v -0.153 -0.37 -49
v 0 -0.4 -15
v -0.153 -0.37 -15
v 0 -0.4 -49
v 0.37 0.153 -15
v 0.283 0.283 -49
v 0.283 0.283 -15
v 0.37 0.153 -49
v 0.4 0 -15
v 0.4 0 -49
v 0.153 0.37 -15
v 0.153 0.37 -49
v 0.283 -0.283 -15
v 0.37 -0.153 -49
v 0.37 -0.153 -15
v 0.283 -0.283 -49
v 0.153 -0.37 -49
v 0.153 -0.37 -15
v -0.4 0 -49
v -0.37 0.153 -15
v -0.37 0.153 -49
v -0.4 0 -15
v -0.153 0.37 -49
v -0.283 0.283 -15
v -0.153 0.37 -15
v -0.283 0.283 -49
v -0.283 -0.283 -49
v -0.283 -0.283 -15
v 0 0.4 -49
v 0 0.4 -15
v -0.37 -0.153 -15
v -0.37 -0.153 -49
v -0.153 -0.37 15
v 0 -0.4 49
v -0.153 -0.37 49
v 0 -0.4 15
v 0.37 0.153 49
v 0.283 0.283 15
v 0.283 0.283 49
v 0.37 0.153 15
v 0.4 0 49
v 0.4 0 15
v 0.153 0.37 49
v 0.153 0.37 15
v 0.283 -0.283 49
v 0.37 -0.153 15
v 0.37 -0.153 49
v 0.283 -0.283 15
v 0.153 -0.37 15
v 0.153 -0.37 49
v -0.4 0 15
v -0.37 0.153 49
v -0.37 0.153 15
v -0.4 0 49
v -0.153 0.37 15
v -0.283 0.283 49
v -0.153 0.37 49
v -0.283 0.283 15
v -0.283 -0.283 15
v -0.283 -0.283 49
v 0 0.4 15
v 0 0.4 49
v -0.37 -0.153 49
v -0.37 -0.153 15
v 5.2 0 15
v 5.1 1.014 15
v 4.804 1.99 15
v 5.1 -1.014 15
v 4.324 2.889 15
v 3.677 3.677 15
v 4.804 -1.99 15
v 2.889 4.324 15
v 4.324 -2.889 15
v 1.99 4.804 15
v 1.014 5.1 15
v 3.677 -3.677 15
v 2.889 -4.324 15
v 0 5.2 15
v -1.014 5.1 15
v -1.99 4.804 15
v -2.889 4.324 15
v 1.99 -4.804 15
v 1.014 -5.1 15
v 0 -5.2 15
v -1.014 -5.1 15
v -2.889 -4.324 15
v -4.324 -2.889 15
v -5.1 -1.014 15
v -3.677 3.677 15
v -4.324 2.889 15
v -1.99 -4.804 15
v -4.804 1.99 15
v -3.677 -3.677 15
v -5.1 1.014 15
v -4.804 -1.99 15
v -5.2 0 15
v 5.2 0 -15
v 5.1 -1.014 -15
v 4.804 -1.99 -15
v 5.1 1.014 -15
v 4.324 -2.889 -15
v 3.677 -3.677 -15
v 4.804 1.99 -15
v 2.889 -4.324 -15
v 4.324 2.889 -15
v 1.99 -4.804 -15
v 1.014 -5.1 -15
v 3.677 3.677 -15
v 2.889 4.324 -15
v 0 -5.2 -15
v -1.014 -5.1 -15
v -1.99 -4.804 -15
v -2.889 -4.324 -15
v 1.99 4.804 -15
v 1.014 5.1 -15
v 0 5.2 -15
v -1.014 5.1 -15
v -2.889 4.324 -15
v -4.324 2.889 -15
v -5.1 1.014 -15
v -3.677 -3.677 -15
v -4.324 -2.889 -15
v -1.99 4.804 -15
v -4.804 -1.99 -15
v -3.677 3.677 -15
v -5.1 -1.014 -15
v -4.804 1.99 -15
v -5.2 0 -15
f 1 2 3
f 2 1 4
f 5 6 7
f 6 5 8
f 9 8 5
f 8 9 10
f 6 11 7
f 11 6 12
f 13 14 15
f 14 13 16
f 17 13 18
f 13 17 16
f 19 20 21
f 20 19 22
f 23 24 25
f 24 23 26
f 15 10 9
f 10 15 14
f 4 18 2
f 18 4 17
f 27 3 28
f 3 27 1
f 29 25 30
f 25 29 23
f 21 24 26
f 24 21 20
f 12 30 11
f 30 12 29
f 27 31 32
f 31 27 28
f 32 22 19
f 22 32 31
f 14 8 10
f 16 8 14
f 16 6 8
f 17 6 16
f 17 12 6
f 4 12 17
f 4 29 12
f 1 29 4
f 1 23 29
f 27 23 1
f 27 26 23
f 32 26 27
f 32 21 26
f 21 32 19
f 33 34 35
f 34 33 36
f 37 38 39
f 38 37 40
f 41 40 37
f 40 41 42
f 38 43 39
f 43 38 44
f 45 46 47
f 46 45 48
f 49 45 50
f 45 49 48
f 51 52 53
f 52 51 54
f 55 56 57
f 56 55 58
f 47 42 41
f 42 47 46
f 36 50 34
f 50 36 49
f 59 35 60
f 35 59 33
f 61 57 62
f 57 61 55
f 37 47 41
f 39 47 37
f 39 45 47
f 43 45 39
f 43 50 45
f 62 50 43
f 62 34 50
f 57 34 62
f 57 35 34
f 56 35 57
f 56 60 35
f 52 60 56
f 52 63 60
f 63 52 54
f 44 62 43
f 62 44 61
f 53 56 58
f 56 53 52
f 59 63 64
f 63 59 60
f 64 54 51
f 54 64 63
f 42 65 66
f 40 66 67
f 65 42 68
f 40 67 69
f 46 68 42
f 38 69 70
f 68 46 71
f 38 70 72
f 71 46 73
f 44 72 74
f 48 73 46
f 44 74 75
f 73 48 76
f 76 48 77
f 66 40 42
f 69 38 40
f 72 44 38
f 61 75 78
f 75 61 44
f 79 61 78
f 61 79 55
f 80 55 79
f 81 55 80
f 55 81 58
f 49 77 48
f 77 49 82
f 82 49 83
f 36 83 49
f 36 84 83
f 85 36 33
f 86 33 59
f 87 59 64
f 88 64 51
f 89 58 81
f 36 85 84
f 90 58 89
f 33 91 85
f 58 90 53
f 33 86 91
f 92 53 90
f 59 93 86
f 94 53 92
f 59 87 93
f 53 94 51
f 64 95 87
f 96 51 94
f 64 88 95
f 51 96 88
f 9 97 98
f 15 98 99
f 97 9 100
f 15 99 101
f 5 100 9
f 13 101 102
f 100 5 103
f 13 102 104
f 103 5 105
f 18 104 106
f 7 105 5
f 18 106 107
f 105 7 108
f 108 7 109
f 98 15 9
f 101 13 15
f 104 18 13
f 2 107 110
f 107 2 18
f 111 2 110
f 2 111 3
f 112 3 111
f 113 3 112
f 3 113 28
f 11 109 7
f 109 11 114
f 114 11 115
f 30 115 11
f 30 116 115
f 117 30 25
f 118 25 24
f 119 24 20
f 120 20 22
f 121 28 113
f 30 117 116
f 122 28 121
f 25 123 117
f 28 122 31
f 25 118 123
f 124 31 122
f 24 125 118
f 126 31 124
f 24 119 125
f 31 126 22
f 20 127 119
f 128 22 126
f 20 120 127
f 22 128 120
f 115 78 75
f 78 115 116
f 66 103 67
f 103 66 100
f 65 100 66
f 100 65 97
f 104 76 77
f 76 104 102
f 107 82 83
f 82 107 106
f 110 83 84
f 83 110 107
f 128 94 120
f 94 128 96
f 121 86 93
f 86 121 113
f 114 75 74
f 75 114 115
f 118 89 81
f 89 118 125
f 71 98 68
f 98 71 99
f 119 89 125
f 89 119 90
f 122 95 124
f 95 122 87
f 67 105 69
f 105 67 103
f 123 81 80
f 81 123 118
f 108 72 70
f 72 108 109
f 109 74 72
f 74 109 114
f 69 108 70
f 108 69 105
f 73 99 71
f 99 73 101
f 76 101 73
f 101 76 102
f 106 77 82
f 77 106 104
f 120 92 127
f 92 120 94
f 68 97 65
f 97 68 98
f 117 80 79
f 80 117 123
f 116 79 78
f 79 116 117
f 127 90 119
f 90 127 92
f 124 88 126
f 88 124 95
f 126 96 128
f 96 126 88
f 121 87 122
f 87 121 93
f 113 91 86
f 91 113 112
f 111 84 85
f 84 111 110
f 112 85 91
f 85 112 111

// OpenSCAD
// Parameters
body_length_mm = 25; //[12.5:50:0.5]
body_diameter_mm = 8; //[4:16:0.5]
lead_diameter_mm = 0.8; //[0.4:1.6:0.05]
lead_length_each_mm = 35; //[15:70:1]
endcap_length_mm = 2.5; //[1:6:0.25]
endcap_diameter_mm = 8.4; //[4.2:16.8:0.5]
overlap_mm = 1; //[0.5:2:0.1]

// Resistor - complete geometry
module resistor() {
  color([0.85, 0.85, 0.8]) { // Enamel-coated body
    // Body
    translate([0, 0, 0])
      cylinder(h=body_length_mm, r=body_diameter_mm/2, center=true, $fn=32);
    // Endcaps
    translate([0, 0, -(body_length_mm/2 + endcap_length_mm/2 - overlap_mm)])
      cylinder(h=endcap_length_mm, r=endcap_diameter_mm/2, center=true, $fn=32);
    translate([0, 0, (body_length_mm/2 + endcap_length_mm/2 - overlap_mm)])
      cylinder(h=endcap_length_mm, r=endcap_diameter_mm/2, center=true, $fn=32);
    // Leads
    translate([0, 0, -(body_length_mm/2 + endcap_length_mm + lead_length_each_mm/2 - overlap_mm)])
      cylinder(h=lead_length_each_mm, r=lead_diameter_mm/2, center=true, $fn=16);
    translate([0, 0, (body_length_mm/2 + endcap_length_mm + lead_length_each_mm/2 - overlap_mm)])
      cylinder(h=lead_length_each_mm, r=lead_diameter_mm/2, center=true, $fn=16);
  }
}

// Al Clad Resistor Assembly - complete geometry
module al_clad_resistor_assembly() {
  color([0.75, 0.75, 0.77]) { // Aluminum cladding
    // Cladding
    translate([0, 0, 0])
      cylinder(h=body_length_mm + 2 * endcap_length_mm, r=endcap_diameter_mm/2 + 0.5, center=true, $fn=32);
  }
  resistor();
}

// Sleeved Resistor - complete geometry
module sleeved_resistor() {
  color([0.1, 0.1, 0.6]) { // Blue sleeving
    // Sleeving
    translate([0, 0, 0])
      cylinder(h=body_length_mm + 2 * endcap_length_mm, r=endcap_diameter_mm/2 + 1, center=true, $fn=32);
  }
  resistor();
}

// Al Clad Resistor - complete geometry
module al_clad_resistor() {
  color([0.4, 0.4, 0.43]) { // Steel look
    // Cladding
    translate([0, 0, 0])
      cylinder(h=body_length_mm + 2 * endcap_length_mm, r=endcap_diameter_mm/2 + 0.5, center=true, $fn=32);
  }
  resistor();
}

// Assembly
module assembly() {
  translate([0, 0, 0]) resistor();
  translate([0, 0, 0]) al_clad_resistor_assembly();
  translate([0, 0, 0]) sleeved_resistor();
  translate([0, 0, 0]) al_clad_resistor();
}

assembly();
